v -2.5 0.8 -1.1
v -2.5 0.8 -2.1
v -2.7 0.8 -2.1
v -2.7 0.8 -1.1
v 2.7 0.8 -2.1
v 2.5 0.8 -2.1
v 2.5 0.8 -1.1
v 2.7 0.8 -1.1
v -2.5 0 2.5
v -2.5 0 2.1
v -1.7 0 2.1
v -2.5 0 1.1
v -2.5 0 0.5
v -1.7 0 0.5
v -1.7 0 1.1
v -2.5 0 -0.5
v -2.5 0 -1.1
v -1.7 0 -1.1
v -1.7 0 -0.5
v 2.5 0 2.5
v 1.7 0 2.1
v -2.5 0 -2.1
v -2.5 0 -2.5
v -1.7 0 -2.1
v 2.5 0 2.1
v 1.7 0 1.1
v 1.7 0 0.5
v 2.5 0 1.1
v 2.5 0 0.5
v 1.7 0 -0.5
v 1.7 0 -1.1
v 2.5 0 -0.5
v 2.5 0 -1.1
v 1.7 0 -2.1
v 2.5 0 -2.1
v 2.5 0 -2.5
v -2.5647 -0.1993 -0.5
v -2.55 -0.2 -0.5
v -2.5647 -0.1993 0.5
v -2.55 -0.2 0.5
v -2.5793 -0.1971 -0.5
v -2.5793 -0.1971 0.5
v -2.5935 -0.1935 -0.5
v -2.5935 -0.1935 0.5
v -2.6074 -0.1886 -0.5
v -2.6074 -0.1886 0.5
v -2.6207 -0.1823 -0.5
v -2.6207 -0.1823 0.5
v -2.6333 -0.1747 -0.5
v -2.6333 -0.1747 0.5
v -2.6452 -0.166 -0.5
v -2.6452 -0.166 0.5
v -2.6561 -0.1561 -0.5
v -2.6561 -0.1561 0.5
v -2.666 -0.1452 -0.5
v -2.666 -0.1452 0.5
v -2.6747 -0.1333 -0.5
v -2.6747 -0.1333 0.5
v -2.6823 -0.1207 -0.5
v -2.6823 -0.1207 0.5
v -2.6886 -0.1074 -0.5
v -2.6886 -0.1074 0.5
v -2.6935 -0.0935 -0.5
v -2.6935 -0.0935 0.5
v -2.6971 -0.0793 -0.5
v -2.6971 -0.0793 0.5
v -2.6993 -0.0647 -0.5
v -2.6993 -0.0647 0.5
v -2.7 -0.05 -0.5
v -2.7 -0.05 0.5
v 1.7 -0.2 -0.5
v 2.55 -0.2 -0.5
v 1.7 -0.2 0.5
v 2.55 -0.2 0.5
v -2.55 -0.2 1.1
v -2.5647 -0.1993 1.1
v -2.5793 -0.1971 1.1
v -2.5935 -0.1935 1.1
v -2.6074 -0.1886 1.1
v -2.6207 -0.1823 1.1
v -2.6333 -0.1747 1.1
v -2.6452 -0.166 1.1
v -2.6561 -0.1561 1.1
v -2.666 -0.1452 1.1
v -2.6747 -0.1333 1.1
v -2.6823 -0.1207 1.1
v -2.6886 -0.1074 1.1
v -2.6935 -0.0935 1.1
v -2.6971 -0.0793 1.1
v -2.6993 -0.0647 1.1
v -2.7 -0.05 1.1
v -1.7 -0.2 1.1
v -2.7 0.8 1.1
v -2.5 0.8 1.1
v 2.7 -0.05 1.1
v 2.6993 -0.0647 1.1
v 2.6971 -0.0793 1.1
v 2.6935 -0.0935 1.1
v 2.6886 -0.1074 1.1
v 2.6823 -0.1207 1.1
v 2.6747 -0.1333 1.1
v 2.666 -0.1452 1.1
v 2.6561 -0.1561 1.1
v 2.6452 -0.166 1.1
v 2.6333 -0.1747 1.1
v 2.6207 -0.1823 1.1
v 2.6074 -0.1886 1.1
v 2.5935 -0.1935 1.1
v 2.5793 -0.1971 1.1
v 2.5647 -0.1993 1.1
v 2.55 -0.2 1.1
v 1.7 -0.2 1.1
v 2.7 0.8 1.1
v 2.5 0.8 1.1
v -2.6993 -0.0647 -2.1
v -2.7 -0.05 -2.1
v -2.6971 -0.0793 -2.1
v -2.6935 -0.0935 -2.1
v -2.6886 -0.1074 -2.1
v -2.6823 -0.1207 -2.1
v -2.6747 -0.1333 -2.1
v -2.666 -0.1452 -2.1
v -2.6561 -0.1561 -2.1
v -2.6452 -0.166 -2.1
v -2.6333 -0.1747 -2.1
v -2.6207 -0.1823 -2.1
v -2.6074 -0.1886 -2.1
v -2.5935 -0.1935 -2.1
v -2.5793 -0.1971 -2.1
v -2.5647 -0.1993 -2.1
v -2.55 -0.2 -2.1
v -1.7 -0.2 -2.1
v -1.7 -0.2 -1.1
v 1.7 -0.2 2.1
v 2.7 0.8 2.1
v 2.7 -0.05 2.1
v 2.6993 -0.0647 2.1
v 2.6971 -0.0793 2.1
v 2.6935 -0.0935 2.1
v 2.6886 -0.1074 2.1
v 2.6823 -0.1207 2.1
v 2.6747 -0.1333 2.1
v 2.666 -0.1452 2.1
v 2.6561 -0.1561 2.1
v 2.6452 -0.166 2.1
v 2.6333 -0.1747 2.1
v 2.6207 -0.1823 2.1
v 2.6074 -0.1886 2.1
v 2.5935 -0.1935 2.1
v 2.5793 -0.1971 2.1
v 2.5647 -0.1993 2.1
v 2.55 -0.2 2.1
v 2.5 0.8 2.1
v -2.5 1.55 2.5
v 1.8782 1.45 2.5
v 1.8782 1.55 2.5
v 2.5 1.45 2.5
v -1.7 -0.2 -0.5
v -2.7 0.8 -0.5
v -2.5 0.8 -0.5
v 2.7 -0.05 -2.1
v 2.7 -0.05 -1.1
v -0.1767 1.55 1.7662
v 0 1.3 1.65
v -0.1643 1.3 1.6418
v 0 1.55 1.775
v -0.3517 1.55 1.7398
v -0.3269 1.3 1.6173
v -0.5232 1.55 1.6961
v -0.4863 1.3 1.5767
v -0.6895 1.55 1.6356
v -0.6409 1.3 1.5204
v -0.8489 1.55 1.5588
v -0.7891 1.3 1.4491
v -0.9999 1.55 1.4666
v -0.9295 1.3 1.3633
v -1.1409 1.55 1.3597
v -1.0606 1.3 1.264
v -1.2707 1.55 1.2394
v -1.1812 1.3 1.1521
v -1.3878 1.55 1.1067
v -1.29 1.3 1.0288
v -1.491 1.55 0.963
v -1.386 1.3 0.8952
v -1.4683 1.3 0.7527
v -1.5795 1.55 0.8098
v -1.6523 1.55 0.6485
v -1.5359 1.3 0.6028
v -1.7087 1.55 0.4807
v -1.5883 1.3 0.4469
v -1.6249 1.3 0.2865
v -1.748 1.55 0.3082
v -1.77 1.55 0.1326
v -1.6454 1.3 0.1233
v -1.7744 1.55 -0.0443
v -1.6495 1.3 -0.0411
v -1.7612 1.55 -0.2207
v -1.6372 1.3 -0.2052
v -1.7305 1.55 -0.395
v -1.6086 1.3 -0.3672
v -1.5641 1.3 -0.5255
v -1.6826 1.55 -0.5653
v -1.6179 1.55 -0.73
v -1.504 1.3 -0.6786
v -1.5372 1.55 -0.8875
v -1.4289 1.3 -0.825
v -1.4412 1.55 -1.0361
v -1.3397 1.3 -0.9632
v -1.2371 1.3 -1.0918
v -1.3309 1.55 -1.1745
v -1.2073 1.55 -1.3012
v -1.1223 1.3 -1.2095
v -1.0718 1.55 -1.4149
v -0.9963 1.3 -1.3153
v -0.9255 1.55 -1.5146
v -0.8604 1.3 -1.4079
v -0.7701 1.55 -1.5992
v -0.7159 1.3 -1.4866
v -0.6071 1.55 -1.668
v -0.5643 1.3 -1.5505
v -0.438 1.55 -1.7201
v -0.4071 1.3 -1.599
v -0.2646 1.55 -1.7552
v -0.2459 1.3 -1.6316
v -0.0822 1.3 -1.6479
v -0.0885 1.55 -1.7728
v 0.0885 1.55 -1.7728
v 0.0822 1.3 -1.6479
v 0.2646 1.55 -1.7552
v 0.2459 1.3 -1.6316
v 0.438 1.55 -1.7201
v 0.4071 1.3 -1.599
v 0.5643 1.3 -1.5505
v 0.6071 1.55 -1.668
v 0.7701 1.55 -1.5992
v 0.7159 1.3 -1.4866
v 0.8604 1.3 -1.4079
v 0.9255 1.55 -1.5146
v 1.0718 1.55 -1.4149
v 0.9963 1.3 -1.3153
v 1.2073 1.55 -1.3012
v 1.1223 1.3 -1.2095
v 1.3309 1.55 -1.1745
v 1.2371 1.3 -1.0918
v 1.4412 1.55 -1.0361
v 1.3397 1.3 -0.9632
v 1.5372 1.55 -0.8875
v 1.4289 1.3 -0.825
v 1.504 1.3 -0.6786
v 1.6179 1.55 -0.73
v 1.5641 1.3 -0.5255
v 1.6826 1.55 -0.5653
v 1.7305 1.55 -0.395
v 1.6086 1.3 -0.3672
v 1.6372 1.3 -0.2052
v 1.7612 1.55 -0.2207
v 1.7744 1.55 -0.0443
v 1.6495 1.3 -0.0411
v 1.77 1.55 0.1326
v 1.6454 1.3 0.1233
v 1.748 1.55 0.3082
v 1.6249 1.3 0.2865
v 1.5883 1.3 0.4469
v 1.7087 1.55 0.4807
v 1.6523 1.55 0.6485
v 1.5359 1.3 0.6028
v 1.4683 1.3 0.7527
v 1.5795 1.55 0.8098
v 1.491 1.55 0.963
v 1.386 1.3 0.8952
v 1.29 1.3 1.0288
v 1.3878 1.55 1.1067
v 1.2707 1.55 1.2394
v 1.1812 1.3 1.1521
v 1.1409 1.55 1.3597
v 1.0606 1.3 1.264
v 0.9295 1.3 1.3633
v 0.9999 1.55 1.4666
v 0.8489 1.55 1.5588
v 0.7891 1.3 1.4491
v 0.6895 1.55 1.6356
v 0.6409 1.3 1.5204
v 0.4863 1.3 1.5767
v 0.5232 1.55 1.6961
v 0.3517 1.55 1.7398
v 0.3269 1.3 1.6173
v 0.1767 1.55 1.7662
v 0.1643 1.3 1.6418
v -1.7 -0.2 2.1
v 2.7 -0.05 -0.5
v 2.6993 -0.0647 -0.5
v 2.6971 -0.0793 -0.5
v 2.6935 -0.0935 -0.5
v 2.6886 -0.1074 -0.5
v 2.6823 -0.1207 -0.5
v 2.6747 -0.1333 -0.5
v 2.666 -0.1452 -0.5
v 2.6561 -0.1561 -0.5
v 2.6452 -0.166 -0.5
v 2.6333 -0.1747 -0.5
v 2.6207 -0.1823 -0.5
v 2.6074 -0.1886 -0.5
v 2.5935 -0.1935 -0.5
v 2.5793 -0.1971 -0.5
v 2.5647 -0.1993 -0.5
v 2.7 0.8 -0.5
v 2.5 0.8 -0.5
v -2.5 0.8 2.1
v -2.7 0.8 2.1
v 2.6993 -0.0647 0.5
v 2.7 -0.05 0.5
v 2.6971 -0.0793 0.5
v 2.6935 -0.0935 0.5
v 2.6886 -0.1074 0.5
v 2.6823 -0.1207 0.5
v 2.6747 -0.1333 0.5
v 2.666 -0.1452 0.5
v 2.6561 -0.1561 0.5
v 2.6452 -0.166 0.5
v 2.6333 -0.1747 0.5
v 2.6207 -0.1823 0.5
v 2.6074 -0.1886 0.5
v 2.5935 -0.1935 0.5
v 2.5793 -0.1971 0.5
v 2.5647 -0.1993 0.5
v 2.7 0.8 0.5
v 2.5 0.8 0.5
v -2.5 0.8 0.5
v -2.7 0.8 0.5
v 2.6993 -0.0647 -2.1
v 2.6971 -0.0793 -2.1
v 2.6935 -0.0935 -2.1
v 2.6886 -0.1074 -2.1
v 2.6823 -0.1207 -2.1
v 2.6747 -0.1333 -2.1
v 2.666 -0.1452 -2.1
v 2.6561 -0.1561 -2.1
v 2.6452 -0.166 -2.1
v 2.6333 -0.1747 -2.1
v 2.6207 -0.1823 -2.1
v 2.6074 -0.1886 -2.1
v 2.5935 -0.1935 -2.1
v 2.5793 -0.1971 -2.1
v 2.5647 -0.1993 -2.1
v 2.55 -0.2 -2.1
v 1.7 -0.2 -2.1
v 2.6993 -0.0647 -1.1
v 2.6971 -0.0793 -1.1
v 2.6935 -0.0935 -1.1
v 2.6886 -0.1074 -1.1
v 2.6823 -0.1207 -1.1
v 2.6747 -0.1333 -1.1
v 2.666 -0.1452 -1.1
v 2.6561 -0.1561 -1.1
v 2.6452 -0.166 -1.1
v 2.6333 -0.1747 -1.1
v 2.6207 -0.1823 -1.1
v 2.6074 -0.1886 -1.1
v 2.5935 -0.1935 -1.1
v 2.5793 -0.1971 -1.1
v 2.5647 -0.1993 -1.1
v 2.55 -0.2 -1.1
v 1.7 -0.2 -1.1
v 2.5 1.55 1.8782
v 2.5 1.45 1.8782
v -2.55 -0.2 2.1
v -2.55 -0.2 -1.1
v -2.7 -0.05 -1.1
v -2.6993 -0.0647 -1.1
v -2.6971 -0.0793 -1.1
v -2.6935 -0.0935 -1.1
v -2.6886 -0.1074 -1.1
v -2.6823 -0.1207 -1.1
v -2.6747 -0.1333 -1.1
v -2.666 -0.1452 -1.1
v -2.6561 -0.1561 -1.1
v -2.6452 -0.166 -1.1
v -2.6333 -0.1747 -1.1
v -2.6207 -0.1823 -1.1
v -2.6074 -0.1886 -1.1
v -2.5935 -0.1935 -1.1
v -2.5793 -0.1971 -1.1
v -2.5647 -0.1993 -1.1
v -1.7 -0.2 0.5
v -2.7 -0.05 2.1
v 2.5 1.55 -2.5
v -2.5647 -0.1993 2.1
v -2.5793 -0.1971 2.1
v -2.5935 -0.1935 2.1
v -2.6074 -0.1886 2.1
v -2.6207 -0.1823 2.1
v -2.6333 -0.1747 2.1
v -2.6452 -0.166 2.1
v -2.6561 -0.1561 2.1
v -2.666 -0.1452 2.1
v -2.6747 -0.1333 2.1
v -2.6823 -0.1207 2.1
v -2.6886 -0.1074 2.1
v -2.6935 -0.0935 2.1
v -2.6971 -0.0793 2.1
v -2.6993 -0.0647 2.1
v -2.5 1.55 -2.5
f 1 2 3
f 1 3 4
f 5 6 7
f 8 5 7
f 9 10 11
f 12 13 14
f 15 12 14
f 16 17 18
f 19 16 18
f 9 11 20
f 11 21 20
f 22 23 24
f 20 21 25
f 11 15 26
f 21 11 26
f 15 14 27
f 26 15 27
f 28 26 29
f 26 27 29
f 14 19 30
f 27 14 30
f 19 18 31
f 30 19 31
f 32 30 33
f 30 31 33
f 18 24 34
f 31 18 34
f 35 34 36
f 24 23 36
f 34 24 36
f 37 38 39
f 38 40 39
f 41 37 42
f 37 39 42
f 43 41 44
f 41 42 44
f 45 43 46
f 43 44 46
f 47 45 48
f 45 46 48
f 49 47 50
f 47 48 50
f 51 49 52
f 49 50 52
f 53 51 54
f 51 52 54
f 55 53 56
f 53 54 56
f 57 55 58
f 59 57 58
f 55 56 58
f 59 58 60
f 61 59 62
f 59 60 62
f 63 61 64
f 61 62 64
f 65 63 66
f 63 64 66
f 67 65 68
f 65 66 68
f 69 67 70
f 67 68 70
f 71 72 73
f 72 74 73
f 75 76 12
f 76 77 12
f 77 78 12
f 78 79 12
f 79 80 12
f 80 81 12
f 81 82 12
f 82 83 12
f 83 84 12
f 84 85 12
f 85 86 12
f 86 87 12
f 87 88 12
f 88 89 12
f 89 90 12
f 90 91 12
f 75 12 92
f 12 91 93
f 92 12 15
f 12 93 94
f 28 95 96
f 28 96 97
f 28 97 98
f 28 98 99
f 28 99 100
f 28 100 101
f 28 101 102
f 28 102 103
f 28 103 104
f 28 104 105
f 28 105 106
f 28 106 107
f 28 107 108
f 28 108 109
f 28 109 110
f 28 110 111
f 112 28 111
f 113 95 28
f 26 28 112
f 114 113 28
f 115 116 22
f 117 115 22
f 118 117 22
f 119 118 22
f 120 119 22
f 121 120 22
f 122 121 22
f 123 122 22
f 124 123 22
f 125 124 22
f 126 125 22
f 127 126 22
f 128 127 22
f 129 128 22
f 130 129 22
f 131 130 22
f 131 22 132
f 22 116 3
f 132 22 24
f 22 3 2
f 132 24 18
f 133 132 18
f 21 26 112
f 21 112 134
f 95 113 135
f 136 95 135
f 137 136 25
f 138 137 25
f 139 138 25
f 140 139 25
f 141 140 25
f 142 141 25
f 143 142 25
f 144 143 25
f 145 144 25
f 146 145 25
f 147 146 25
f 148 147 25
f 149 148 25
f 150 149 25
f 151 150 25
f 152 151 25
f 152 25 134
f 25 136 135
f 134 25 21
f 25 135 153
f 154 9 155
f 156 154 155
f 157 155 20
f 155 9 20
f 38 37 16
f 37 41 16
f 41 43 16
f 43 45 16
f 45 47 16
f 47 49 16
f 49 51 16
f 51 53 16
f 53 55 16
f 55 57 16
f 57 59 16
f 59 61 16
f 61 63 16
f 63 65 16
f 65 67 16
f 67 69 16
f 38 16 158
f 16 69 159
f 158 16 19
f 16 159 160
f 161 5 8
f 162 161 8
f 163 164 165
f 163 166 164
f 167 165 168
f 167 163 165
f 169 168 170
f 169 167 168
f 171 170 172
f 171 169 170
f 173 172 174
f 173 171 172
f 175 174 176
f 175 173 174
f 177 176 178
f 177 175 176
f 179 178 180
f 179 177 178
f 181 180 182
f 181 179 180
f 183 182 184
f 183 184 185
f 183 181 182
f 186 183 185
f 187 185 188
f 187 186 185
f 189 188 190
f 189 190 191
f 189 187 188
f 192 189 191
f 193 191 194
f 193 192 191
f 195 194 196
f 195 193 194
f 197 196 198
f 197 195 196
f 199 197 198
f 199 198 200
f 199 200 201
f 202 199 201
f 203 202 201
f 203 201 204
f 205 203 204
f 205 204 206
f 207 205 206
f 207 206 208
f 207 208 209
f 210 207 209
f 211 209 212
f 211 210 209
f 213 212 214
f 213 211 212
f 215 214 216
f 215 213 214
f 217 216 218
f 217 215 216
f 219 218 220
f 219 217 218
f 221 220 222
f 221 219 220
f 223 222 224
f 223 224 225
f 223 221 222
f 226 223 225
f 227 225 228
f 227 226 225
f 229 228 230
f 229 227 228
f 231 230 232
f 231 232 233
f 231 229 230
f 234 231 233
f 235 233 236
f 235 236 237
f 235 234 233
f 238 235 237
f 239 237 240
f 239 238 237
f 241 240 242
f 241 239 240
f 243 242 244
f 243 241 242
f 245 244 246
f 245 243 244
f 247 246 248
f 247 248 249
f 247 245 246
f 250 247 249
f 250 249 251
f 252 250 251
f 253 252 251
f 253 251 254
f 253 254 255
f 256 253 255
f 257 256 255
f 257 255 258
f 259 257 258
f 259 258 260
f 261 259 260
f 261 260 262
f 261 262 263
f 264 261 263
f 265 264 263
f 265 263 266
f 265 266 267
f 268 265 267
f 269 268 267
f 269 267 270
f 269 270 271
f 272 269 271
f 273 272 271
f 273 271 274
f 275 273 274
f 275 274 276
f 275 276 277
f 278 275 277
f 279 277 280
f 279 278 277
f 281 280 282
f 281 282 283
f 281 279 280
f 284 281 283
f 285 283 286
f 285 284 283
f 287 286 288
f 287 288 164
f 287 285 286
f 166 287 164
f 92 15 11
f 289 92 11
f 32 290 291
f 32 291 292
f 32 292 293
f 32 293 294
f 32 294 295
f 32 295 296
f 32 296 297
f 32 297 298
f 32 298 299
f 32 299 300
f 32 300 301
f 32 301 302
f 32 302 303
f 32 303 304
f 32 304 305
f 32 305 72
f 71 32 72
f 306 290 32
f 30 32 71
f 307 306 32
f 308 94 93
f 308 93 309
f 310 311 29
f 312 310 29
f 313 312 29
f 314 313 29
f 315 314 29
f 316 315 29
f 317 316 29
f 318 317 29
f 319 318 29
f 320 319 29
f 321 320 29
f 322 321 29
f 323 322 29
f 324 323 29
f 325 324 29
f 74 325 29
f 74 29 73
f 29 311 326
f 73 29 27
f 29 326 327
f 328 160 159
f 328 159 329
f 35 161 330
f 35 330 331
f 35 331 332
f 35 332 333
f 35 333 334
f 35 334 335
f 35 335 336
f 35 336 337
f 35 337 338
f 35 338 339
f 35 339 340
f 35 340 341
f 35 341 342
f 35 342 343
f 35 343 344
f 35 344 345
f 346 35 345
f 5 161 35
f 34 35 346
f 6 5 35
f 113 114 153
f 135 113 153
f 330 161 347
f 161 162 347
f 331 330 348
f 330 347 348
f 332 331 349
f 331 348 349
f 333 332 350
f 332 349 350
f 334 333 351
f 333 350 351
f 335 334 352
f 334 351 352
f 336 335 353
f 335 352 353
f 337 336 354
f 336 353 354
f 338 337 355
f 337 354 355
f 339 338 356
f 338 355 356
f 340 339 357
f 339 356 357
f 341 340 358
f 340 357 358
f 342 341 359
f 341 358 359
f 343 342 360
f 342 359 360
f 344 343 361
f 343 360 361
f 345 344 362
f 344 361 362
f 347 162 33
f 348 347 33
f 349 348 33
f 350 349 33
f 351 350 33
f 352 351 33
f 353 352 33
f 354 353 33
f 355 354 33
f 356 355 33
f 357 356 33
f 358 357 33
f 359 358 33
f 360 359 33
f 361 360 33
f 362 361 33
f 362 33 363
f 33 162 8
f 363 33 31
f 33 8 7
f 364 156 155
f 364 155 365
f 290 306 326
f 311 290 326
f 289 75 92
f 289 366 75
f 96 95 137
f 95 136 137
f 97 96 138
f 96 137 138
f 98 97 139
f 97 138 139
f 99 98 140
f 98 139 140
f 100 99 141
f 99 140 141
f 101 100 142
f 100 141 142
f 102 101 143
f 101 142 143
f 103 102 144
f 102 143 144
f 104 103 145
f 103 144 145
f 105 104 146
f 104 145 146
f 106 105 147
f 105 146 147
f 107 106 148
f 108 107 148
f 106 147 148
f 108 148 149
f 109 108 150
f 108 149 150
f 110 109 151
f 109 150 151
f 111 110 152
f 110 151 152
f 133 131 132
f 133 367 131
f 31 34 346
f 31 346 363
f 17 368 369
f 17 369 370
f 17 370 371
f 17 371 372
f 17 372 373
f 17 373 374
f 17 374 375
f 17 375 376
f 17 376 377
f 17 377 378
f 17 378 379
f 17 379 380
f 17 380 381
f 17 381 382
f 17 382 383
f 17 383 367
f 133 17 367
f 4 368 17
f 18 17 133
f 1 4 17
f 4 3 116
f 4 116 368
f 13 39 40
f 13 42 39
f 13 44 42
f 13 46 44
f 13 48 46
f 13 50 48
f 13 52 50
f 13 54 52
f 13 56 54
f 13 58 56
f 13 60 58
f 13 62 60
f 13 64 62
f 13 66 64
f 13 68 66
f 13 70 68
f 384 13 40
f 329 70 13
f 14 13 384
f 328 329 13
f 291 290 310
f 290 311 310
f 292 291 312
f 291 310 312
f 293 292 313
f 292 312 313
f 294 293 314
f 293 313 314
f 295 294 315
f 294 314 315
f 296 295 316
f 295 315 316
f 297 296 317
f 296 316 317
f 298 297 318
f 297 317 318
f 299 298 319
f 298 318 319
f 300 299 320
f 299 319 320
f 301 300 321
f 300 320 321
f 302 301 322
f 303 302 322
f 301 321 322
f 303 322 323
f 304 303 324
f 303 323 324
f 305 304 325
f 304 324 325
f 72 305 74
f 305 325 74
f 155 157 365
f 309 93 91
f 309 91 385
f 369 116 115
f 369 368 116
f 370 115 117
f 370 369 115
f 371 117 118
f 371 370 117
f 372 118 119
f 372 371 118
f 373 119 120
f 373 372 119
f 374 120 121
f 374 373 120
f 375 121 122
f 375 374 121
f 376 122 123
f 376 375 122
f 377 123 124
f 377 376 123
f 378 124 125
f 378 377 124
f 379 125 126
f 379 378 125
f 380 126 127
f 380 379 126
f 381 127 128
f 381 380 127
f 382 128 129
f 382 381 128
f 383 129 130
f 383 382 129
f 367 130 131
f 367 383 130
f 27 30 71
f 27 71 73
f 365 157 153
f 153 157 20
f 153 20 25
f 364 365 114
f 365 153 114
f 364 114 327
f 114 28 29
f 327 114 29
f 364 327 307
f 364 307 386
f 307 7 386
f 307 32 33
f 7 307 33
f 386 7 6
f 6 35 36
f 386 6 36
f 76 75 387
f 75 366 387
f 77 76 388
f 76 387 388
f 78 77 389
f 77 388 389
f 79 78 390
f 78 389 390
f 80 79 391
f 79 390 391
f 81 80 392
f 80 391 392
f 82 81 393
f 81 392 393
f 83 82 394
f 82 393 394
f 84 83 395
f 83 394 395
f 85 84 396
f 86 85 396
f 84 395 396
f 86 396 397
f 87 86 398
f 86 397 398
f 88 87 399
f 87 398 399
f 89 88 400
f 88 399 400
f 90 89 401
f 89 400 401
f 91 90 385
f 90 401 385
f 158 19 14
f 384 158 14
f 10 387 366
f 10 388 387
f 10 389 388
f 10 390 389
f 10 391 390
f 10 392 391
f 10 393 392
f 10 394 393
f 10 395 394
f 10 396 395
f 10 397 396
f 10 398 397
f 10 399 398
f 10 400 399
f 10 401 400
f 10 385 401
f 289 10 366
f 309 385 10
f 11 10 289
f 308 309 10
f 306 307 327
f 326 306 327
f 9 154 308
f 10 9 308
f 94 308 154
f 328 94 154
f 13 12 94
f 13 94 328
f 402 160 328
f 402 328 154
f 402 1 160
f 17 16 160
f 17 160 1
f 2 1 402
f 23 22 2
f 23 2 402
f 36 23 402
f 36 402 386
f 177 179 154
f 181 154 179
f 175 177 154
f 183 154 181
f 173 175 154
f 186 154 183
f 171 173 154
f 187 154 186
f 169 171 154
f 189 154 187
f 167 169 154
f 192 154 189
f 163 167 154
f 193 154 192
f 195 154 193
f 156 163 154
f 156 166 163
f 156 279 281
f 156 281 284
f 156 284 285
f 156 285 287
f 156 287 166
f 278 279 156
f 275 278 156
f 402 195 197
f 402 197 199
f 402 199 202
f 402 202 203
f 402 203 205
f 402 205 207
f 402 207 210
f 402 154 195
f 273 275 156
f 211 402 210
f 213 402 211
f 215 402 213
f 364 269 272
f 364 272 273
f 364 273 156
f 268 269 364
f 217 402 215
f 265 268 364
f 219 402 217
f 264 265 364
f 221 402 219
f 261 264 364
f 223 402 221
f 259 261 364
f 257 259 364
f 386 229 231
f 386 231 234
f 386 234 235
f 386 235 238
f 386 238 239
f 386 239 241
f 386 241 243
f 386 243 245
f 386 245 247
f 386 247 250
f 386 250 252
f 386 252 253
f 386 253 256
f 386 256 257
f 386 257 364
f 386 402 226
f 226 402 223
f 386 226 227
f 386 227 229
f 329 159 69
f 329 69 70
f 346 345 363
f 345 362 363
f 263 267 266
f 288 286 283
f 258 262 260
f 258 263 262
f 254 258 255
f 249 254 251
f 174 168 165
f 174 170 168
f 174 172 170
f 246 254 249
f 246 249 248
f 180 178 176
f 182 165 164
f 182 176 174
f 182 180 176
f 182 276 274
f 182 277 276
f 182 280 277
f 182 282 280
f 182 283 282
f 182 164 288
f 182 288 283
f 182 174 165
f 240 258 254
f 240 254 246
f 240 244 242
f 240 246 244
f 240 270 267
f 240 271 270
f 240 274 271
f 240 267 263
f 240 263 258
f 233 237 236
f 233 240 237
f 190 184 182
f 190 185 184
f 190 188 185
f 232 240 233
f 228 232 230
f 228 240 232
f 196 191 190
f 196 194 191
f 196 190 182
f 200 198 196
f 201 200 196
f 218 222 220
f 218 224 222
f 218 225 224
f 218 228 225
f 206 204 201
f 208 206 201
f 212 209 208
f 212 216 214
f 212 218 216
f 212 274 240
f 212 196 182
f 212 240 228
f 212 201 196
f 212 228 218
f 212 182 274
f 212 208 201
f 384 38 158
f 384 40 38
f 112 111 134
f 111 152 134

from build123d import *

# Parameters (mm, degrees)
SKETCH1_W            = 5
SKETCH1_H            = 5
BOSS_EXTRUDE1_DEPTH  = 1.55
SKETCH6_W            = 1
SKETCH6_H            = 0.8
BOSS_EXTRUDE3_DEPTH  = 0.2
SKETCH7_W            = 1
SKETCH7_H            = 1
BOSS_EXTRUDE5_DEPTH  = 0.2
FILLET1_R            = 0.15
FILLET1_OF_MIRROR1_R = 0.15
CUT_EXTRUDE2_DEPTH   = 0.1


with BuildPart() as part:
    # Sketch1 → Boss-Extrude1 (new body)
    with BuildSketch(Plane(origin=(0, 0, 0), x_dir=(1, 0, 0), z_dir=(0, 1, 0))):
        Rectangle(SKETCH1_W, SKETCH1_H)
    extrude(amount=BOSS_EXTRUDE1_DEPTH)

    # Sketch5 → CSK SLOT for M2 Flat Head Machine Screw1 (revolve, cut)
    with BuildSketch(Plane(origin=(0, 1.55, 0), x_dir=(0, 0, 1), z_dir=(1, 0, 0))):
        Polygon((0, 0), (0, 0.25), (1.65, 0.25), (1.775, 0), align=None)
    revolve(axis=Axis((0, 7.9, 0), (0, -1, 0)), mode=Mode.SUBTRACT)

    # Sketch6 → Boss-Extrude3 (add)
    with BuildSketch(Plane.ZY.offset(2.5)):
        with Locations((0, 0.4)):
            Rectangle(SKETCH6_W, SKETCH6_H)
        with Locations((1.6, 0.4)):
            Rectangle(SKETCH6_W, SKETCH6_H)
        with Locations((-1.6, 0.4)):
            Rectangle(SKETCH6_W, SKETCH6_H)
    boss_extrude3 = extrude(amount=BOSS_EXTRUDE3_DEPTH)

    # Sketch7 → Boss-Extrude5 (add)
    with BuildSketch(Plane.XZ):
        with Locations((-2.2, -1.6)):
            Rectangle(SKETCH7_W, SKETCH7_H)
        with Locations((-2.2, 0)):
            Rectangle(SKETCH7_W, SKETCH7_H)
        with Locations((-2.2, 1.6)):
            Rectangle(SKETCH7_W, SKETCH7_H)
    boss_extrude5 = extrude(amount=BOSS_EXTRUDE5_DEPTH)

    # Fillet1
    fillet1_edges = [part.edges().sort_by_distance(p)[0] for p in [
        (-2.7, -0.2, -1.6),
        (-2.7, -0.2, 0),
        (-2.7, -0.2, 1.6),
    ]]
    fillet(fillet1_edges, radius=FILLET1_R)

    # Mirror1: Boss-Extrude3, Boss-Extrude5 across plane
    add(boss_extrude3.mirror(Plane.ZY))
    add(boss_extrude5.mirror(Plane.ZY))

    # Fillet1 of Mirror1
    fillet1_of_mirror1_edges = [part.edges().sort_by_distance(p)[0] for p in [
        (2.7, -0.2, -1.6),
        (2.7, -0.2, 0),
        (2.7, -0.2, 1.6),
    ]]
    fillet(fillet1_of_mirror1_edges, radius=FILLET1_OF_MIRROR1_R)

    # Sketch9 → Cut-Extrude2 (cut)
    with BuildSketch(Plane(origin=(0, 1.55, 0), x_dir=(1, 0, 0), z_dir=(0, 1, 0))):
        Polygon((1.878160882, -2.5), (2.5, -1.878160882), (2.5, -2.5), align=None)
    extrude(amount=-CUT_EXTRUDE2_DEPTH, mode=Mode.SUBTRACT)


solid = part.part
